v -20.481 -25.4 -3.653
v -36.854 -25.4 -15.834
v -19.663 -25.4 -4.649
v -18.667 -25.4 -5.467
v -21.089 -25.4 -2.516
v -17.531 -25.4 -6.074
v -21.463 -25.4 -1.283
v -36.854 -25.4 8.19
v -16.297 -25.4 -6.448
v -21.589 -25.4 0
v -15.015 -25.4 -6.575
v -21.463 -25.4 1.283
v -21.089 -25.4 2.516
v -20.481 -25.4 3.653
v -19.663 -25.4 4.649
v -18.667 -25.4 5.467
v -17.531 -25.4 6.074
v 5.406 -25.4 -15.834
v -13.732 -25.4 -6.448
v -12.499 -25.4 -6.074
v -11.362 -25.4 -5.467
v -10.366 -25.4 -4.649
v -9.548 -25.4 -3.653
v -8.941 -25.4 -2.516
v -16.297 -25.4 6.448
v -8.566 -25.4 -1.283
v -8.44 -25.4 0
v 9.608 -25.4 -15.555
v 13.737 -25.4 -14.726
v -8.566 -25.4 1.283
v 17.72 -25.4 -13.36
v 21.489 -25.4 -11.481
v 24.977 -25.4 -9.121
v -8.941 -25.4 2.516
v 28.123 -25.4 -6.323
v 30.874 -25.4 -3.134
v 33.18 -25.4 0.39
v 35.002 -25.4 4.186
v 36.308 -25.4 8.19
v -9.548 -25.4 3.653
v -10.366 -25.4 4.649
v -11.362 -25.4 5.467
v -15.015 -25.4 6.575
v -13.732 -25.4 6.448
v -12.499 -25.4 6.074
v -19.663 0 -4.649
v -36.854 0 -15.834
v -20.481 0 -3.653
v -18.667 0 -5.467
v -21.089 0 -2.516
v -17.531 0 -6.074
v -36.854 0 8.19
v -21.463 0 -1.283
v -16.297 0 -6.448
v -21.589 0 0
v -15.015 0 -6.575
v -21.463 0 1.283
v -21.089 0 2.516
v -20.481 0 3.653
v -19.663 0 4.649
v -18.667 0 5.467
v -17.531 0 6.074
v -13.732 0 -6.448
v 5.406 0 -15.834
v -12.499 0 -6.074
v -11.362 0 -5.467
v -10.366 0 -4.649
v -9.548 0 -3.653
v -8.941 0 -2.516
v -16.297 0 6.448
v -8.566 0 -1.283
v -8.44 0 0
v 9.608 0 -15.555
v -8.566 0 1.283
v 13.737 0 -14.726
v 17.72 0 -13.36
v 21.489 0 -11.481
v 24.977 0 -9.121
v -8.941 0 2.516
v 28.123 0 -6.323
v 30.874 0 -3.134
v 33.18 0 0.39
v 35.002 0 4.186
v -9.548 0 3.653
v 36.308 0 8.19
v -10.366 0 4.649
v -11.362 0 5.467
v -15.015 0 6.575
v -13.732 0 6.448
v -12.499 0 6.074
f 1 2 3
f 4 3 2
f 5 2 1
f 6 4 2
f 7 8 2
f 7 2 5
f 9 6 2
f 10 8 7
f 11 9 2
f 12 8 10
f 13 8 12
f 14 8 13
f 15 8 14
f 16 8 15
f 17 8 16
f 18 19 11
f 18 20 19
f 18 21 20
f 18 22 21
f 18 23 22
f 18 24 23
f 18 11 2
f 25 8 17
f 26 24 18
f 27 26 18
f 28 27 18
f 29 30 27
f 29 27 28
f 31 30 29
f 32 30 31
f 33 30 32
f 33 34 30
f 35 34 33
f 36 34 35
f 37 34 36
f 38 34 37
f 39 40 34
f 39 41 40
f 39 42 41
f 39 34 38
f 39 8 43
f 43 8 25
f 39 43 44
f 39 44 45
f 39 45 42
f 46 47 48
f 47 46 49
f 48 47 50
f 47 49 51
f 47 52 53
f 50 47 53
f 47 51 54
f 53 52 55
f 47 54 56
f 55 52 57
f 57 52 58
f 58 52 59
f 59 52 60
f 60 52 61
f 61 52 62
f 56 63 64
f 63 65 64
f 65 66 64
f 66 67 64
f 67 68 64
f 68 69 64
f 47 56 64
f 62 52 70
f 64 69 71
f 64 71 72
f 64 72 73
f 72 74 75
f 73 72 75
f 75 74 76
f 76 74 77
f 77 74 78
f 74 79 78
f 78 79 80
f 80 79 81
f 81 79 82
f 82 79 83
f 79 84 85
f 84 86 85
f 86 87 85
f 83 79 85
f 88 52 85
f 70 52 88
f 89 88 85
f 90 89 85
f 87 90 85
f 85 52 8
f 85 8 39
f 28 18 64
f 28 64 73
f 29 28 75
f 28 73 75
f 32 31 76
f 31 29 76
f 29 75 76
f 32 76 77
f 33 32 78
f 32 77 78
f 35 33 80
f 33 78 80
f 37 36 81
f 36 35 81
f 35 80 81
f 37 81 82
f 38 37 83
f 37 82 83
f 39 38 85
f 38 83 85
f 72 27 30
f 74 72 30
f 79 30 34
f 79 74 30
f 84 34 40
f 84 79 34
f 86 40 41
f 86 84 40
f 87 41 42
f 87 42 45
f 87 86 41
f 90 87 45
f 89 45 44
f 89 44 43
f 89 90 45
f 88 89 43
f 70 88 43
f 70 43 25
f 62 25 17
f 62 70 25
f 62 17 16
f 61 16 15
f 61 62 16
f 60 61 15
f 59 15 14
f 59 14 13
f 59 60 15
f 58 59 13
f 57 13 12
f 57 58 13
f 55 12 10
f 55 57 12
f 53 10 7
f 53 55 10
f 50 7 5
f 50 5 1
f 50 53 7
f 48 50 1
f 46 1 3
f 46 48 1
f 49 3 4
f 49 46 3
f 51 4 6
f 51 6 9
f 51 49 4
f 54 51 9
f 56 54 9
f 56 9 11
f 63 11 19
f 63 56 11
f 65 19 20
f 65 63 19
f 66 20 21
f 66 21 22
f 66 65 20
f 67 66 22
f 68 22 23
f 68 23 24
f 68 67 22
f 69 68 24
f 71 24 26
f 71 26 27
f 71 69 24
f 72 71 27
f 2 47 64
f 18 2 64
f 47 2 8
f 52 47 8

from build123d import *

# Parameters (mm, degrees)
F0_W        = 73.1619596481
F0_H        = 24.0233289078
F0_R        = 6.5745281788
F1_DEPTH    = 25.4
F2_T1_DEPTH = 179.9105347495


# Not quite as in the source:
# - a fillet or chamfer that OpenCascade refuses, or shapes differently, is made with other operations: its cross-section is extruded or revolved along the edge and cut away or added


with BuildPart() as f1:
    # F0 (on Front) → F1 (new body)
    with BuildSketch(Plane.XZ):
        with Locations((-0.2729967237, -3.8218903355)):
            Rectangle(F0_W, F0_H)
        with Locations((-15.0145851076, 0)):
            Circle(F0_R, mode=Mode.SUBTRACT)
    extrude(amount=F1_DEPTH)

    # F2: fillet of radius 31.8869327318 on 1 edges, made by hand

    # F2_s2 → F2_t1 (cut)
    with BuildSketch(Plane.XZ.offset(-77.2552673747)):
        with BuildLine():
            ThreePointArc((5.4058761505, -15.8335547894), (24.9766486554, -9.1212390876), (36.3079831004, 8.1897741184))
            Line((36.3079831004, 8.1897741184), (36.3079831004, -15.8335547894))
            Line((36.3079831004, -15.8335547894), (5.4058761505, -15.8335547894))
        make_face()
    extrude(amount=F2_T1_DEPTH, mode=Mode.SUBTRACT)


solid = f1.part
